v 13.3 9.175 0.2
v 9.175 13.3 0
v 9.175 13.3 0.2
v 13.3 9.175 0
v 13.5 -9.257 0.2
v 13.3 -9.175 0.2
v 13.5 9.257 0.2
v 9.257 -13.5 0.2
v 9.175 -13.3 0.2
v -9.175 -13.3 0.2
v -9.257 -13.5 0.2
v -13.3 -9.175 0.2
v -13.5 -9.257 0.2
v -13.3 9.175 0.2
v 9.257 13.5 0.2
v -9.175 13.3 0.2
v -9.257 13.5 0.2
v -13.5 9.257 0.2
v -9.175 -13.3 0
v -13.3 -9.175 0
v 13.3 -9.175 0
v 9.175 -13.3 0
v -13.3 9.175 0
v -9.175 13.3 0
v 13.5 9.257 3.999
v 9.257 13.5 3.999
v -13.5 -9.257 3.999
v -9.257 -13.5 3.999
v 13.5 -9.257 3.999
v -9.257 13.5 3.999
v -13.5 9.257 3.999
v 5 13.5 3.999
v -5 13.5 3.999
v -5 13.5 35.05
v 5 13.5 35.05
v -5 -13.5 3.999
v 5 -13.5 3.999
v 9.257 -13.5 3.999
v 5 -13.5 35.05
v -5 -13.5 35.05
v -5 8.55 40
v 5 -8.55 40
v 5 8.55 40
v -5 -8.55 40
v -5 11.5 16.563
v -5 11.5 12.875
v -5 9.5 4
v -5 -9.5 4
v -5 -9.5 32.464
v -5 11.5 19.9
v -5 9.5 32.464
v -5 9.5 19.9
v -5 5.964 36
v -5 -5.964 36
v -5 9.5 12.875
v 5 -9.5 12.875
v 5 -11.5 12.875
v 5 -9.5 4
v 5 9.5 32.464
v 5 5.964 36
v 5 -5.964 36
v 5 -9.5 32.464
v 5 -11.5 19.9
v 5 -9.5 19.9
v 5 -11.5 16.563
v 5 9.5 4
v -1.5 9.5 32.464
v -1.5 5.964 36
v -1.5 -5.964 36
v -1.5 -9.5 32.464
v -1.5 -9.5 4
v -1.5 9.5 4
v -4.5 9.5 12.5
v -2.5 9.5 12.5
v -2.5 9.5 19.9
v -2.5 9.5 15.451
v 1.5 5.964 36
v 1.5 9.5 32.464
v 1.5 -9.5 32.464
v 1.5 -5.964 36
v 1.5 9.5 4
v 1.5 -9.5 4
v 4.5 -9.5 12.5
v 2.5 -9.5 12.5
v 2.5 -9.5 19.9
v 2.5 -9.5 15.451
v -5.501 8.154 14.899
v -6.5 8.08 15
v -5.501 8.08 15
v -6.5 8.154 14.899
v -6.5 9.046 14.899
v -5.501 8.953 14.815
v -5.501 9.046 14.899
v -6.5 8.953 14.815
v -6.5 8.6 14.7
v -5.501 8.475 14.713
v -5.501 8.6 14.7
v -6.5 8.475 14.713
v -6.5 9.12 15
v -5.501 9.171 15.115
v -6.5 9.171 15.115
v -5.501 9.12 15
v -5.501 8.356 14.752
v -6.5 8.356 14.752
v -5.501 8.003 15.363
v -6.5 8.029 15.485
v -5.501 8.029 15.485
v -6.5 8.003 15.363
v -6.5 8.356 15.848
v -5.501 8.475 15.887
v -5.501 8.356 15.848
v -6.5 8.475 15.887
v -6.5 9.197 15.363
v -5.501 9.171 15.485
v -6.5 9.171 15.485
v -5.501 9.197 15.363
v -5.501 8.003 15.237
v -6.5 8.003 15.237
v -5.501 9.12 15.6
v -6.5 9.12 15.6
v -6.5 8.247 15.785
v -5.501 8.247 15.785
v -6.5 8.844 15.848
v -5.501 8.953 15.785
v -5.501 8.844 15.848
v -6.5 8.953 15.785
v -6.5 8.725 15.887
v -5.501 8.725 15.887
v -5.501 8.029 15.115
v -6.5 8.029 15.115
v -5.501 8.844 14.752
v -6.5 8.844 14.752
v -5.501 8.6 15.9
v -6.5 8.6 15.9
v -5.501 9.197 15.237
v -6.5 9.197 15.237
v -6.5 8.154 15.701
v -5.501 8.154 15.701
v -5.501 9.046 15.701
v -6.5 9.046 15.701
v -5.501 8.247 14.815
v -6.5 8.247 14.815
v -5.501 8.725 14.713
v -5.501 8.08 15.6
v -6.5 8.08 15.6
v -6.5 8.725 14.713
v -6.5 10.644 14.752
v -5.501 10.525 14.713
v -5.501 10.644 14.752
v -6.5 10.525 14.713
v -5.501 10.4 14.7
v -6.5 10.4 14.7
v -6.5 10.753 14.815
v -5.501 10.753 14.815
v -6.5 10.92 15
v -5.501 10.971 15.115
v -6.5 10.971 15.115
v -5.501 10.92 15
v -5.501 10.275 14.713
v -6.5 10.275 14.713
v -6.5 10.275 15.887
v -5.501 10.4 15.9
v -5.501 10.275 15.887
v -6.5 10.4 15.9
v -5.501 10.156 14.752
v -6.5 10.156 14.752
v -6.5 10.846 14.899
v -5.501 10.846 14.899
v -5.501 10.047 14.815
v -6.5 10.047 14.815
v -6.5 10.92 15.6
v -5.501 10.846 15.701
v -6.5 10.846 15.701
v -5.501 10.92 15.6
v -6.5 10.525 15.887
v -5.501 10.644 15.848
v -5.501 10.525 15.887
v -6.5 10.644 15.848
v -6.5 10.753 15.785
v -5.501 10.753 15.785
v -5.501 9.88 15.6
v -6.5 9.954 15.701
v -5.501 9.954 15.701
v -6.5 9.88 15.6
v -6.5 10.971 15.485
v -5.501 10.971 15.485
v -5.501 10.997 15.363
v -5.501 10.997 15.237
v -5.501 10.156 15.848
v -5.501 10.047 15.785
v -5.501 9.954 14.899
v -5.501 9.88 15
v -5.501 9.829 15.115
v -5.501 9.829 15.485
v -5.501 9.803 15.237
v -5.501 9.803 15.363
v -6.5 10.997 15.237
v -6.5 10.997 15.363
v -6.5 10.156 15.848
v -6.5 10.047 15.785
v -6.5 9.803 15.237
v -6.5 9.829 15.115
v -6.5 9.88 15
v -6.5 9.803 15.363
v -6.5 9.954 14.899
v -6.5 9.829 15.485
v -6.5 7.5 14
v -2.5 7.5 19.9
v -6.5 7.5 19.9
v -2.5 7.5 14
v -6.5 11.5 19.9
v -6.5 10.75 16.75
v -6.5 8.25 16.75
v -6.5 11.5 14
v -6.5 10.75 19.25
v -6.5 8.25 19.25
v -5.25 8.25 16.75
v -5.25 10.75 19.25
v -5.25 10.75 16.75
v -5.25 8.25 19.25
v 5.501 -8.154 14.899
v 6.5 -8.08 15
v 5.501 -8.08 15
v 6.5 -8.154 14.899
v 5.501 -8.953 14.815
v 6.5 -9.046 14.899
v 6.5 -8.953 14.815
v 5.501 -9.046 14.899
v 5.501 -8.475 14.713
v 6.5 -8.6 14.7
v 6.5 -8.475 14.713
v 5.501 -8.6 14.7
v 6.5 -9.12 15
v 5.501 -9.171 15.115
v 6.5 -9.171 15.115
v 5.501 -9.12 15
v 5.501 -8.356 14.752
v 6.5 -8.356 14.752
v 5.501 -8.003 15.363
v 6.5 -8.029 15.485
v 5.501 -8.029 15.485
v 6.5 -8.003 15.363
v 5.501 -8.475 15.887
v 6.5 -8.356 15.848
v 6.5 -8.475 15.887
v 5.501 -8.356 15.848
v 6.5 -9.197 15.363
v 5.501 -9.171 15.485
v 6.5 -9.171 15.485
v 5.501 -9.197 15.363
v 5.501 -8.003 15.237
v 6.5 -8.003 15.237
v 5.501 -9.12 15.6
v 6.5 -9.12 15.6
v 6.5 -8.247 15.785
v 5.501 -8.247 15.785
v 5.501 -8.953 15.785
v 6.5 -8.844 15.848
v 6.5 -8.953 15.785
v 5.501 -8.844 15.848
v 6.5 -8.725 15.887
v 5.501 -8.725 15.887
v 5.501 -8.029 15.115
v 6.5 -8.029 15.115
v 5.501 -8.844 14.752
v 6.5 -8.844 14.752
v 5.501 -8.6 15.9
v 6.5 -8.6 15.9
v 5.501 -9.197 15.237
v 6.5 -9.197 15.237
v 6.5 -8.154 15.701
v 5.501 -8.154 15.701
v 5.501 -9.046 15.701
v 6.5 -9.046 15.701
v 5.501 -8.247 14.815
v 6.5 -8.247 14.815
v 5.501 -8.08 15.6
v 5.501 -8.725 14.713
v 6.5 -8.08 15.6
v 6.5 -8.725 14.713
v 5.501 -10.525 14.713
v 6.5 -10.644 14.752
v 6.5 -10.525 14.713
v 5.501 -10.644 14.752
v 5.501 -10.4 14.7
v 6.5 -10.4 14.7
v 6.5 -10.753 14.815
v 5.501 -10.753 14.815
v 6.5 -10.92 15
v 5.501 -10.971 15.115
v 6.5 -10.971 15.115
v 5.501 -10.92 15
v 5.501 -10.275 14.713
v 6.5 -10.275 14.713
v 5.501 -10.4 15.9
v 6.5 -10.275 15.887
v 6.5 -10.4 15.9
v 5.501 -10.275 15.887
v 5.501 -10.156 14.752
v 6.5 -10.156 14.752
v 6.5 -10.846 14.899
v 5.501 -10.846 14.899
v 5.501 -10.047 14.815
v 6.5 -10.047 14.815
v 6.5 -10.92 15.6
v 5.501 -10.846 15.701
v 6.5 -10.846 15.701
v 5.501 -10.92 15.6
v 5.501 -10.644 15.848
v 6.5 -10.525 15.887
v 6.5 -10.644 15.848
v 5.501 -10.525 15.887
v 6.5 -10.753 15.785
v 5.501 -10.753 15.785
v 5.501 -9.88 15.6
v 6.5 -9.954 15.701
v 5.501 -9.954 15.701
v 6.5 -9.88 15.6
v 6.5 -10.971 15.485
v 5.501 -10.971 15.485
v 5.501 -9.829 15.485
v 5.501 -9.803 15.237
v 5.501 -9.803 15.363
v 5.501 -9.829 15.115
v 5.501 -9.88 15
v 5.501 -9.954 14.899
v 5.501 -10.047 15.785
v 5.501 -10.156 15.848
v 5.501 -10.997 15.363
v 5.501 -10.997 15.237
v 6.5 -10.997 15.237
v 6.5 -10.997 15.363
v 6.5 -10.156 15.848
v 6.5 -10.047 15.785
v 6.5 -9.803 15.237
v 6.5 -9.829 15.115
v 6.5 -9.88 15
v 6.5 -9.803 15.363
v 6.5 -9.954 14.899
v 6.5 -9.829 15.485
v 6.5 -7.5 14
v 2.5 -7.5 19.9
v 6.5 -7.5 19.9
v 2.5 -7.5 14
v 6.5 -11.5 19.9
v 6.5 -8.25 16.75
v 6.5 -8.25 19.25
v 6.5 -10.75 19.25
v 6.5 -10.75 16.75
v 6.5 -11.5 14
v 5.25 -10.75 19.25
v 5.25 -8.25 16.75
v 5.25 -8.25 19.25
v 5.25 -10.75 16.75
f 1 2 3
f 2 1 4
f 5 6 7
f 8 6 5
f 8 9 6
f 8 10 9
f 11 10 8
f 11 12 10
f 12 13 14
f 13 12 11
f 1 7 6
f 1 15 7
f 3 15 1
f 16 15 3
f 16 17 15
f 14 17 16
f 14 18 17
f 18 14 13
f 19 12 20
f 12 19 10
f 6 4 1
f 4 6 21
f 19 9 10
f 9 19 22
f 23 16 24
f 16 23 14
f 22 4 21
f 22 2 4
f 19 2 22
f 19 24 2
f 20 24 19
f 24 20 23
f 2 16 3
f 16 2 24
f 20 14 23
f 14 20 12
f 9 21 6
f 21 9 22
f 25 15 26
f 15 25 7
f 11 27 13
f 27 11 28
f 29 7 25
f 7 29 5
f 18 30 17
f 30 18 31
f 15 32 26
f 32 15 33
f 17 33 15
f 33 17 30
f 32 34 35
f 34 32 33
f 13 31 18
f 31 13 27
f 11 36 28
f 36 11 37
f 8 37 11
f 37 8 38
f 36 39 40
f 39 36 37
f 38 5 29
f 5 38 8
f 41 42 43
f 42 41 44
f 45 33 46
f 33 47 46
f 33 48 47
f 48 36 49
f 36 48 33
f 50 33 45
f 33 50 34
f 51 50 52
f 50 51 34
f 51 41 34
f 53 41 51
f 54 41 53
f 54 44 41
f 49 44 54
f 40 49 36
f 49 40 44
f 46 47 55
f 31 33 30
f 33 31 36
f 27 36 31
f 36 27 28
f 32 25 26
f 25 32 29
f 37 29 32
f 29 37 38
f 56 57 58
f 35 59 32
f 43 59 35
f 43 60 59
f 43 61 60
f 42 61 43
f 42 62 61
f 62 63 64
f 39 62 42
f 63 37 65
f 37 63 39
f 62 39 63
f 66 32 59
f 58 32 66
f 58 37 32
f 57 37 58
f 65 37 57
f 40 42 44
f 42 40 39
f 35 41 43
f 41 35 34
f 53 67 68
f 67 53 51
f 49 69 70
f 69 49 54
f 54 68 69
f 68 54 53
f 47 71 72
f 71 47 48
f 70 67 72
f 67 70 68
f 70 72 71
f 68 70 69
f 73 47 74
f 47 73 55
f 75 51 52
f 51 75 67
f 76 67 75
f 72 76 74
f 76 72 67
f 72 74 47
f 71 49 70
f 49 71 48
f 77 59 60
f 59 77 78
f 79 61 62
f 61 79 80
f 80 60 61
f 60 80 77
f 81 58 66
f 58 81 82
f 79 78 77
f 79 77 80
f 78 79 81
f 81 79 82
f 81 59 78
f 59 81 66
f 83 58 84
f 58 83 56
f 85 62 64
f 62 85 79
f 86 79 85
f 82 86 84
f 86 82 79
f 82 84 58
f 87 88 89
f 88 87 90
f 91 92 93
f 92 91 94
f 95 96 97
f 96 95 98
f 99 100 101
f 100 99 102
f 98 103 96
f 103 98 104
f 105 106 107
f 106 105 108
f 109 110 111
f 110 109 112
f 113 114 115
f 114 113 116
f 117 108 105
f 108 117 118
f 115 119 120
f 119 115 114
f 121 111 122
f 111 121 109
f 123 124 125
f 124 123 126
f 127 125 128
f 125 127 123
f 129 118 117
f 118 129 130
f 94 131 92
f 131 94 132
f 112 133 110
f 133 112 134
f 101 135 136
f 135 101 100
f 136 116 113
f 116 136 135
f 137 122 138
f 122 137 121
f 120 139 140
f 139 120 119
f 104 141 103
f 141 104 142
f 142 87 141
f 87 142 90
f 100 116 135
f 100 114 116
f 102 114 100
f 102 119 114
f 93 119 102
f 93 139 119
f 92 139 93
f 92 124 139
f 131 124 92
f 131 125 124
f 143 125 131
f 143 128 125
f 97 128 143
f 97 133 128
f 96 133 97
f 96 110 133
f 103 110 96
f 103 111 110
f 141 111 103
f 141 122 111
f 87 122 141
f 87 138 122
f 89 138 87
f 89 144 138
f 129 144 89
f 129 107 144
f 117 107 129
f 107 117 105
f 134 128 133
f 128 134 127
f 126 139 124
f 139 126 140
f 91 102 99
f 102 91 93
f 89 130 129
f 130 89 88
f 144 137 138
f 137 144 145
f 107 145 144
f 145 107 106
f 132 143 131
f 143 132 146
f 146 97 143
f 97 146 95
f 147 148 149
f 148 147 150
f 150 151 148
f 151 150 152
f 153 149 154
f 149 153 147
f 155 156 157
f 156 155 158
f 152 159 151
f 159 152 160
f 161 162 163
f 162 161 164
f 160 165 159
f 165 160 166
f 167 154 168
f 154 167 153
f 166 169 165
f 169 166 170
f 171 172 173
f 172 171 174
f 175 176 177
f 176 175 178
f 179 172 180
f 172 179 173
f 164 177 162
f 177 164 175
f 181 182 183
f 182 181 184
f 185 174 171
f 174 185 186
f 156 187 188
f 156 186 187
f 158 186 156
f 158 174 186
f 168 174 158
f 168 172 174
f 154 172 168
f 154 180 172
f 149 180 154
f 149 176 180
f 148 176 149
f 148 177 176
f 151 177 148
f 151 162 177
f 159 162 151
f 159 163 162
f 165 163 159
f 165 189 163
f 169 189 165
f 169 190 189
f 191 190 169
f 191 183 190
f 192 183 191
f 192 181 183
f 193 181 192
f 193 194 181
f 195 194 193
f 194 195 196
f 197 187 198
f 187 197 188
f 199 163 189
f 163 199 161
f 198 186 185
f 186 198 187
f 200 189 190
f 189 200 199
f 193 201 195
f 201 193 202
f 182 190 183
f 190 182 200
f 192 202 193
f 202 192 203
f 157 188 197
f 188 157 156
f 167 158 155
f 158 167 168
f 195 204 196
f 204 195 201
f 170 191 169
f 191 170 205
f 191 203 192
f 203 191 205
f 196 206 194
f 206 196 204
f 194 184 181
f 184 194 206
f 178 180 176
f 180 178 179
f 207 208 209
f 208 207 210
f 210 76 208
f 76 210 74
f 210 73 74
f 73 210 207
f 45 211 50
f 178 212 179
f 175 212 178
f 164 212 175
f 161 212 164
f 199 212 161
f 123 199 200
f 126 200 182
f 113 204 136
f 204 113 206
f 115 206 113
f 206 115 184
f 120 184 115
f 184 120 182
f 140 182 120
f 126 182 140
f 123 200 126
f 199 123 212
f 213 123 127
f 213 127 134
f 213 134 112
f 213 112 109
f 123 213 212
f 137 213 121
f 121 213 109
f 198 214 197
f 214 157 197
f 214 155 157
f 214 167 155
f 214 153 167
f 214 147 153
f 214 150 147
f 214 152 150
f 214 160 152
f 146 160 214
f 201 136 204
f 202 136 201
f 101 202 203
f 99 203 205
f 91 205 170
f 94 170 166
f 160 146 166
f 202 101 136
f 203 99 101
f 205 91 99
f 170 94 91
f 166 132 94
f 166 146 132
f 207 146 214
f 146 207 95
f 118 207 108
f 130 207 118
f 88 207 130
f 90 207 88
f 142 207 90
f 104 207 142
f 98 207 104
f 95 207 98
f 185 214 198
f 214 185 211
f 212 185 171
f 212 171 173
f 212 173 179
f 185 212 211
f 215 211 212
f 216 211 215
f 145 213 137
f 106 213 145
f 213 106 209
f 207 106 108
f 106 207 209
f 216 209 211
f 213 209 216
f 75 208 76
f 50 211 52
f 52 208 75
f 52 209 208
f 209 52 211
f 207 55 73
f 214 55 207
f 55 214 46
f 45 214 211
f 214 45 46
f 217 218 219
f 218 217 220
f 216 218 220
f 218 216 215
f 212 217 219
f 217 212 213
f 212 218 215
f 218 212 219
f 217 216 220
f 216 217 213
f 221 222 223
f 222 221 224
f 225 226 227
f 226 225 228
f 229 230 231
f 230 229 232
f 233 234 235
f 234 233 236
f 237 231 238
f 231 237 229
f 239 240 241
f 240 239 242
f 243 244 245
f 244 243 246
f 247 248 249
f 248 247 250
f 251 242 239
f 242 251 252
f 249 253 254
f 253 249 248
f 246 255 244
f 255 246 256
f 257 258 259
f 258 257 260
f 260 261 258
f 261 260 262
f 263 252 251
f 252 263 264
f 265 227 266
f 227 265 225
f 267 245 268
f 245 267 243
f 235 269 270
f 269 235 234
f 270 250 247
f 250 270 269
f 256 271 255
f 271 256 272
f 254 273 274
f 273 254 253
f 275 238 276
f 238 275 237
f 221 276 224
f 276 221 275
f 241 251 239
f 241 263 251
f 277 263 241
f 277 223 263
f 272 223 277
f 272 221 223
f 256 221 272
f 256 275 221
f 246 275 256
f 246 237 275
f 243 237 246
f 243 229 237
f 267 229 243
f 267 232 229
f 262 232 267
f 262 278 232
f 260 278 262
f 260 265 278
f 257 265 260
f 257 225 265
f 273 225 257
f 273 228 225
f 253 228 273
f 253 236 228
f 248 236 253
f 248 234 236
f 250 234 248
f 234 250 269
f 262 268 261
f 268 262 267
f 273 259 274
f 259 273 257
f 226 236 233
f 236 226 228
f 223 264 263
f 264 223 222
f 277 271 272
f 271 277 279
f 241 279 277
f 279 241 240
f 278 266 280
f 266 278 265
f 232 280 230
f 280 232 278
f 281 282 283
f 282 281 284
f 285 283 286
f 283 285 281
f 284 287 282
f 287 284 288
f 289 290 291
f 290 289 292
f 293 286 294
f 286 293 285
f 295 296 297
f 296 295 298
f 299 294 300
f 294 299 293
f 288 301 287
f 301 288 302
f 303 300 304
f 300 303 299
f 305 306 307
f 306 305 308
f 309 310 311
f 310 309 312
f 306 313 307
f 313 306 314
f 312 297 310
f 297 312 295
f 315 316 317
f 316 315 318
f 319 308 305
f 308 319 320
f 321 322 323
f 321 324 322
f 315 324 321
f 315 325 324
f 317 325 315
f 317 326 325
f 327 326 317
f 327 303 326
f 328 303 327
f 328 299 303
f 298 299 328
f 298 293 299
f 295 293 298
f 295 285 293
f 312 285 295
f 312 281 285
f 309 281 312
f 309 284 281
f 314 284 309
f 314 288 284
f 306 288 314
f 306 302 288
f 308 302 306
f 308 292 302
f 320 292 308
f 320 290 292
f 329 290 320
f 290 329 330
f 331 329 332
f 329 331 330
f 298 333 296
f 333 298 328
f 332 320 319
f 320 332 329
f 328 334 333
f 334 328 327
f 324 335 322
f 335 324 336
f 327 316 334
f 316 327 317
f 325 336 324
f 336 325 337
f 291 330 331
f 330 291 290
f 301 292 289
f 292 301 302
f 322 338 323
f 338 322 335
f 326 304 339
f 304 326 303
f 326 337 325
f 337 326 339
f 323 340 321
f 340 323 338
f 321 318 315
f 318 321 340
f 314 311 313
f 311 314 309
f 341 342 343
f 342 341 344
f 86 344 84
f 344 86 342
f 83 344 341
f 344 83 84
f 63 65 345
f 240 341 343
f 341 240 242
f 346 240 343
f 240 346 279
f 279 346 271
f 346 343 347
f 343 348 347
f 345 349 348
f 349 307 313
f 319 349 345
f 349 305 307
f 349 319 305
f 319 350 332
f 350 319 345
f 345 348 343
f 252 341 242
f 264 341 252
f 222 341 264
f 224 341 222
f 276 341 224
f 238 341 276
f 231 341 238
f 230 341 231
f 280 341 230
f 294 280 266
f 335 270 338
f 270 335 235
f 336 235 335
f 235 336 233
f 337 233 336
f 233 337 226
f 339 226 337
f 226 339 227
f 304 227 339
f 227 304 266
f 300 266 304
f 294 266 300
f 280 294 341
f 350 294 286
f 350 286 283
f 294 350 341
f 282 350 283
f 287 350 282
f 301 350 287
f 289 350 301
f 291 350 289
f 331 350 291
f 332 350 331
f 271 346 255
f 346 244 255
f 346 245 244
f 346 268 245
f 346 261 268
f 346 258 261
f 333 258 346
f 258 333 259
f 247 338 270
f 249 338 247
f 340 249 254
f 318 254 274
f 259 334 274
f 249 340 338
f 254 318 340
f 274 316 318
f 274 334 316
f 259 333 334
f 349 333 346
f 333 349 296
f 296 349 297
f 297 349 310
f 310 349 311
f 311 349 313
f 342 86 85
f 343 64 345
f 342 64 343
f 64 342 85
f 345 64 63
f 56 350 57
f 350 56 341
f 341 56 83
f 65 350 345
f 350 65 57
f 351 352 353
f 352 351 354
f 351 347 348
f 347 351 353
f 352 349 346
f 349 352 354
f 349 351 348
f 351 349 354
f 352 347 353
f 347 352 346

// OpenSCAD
eps = 0.001;
layer = 0.2;

// Same height as a marine figure.
height = 40;
width = 27;

base_height = 4;
frame_depth = 10;

module exterior_2d() {
  difference() {
    square(width, center=true);
    
    // Chamfer corners.
    for (a = [-1, 1], b = [-1, 1])
      scale([a, b])
        translate([width/2, width/2])
          rotate([0, 0, 45])
            square(6, center=true);
  }
}

module exterior() {
  // Base.
  linear_extrude(layer)
    offset(-0.2)
      exterior_2d();
  translate([0, 0, layer])
    linear_extrude(base_height - layer)
      exterior_2d();

  // Above the base.
  translate([0, 0, base_height])
    linear_extrude(height - base_height)
      square(width, center=true);
}

module buttons() {
  $fn = 30;
  
  difference() {
    hull() {
      cube([4, 4, 5.9]);
      translate([4, 4, -3])
        cube(eps);
    }
    
    translate([-1.25, 0.75, 2.75])
      cube(2.5);
  
    translate([0, 2, 2.2])
      rotate([0, 90, 0])
        for (a = [-1, 1])
          scale([1, a, 1])
            translate([0.9, 0.9, -eps])
              cylinder(d=1.2, h=1);
  }
}

module door() {
  difference() {
    exterior();
    
    // Cut away front and back of frame.
    for (a = [-1, 1])
      scale([a, 1])
        translate([frame_depth/2, -50, base_height-eps])
          cube(100);
    
    // Chamfer top corners.
    for (a = [-1, 1])
      scale([1, a])
        translate([0, width/2, height])
          rotate([45, 0, 0])
            cube([20, 7, 7], center=true);
    
    // Emboss a door.
    for (b = [-1, 1]) {
      scale([b, 1]) {
        difference() {
          translate([1.5, -(width - 8)/2, base_height])
            cube([20, width - 8, height - 4 - base_height]);
          
          for (a = [-1, 1])
            scale([1, a])
              translate([1.5, -(width - 8)/2, height - 4])
                rotate([45, 0, 0])
                  cube([20, 5, 5], center=true);
        }
      }
    }
  }
  
  // Control buttons.
  for (a = [0, 180])
    rotate([0, 0, a])
      translate([-6.5, 7.5, 14])
        buttons();
}

door();
